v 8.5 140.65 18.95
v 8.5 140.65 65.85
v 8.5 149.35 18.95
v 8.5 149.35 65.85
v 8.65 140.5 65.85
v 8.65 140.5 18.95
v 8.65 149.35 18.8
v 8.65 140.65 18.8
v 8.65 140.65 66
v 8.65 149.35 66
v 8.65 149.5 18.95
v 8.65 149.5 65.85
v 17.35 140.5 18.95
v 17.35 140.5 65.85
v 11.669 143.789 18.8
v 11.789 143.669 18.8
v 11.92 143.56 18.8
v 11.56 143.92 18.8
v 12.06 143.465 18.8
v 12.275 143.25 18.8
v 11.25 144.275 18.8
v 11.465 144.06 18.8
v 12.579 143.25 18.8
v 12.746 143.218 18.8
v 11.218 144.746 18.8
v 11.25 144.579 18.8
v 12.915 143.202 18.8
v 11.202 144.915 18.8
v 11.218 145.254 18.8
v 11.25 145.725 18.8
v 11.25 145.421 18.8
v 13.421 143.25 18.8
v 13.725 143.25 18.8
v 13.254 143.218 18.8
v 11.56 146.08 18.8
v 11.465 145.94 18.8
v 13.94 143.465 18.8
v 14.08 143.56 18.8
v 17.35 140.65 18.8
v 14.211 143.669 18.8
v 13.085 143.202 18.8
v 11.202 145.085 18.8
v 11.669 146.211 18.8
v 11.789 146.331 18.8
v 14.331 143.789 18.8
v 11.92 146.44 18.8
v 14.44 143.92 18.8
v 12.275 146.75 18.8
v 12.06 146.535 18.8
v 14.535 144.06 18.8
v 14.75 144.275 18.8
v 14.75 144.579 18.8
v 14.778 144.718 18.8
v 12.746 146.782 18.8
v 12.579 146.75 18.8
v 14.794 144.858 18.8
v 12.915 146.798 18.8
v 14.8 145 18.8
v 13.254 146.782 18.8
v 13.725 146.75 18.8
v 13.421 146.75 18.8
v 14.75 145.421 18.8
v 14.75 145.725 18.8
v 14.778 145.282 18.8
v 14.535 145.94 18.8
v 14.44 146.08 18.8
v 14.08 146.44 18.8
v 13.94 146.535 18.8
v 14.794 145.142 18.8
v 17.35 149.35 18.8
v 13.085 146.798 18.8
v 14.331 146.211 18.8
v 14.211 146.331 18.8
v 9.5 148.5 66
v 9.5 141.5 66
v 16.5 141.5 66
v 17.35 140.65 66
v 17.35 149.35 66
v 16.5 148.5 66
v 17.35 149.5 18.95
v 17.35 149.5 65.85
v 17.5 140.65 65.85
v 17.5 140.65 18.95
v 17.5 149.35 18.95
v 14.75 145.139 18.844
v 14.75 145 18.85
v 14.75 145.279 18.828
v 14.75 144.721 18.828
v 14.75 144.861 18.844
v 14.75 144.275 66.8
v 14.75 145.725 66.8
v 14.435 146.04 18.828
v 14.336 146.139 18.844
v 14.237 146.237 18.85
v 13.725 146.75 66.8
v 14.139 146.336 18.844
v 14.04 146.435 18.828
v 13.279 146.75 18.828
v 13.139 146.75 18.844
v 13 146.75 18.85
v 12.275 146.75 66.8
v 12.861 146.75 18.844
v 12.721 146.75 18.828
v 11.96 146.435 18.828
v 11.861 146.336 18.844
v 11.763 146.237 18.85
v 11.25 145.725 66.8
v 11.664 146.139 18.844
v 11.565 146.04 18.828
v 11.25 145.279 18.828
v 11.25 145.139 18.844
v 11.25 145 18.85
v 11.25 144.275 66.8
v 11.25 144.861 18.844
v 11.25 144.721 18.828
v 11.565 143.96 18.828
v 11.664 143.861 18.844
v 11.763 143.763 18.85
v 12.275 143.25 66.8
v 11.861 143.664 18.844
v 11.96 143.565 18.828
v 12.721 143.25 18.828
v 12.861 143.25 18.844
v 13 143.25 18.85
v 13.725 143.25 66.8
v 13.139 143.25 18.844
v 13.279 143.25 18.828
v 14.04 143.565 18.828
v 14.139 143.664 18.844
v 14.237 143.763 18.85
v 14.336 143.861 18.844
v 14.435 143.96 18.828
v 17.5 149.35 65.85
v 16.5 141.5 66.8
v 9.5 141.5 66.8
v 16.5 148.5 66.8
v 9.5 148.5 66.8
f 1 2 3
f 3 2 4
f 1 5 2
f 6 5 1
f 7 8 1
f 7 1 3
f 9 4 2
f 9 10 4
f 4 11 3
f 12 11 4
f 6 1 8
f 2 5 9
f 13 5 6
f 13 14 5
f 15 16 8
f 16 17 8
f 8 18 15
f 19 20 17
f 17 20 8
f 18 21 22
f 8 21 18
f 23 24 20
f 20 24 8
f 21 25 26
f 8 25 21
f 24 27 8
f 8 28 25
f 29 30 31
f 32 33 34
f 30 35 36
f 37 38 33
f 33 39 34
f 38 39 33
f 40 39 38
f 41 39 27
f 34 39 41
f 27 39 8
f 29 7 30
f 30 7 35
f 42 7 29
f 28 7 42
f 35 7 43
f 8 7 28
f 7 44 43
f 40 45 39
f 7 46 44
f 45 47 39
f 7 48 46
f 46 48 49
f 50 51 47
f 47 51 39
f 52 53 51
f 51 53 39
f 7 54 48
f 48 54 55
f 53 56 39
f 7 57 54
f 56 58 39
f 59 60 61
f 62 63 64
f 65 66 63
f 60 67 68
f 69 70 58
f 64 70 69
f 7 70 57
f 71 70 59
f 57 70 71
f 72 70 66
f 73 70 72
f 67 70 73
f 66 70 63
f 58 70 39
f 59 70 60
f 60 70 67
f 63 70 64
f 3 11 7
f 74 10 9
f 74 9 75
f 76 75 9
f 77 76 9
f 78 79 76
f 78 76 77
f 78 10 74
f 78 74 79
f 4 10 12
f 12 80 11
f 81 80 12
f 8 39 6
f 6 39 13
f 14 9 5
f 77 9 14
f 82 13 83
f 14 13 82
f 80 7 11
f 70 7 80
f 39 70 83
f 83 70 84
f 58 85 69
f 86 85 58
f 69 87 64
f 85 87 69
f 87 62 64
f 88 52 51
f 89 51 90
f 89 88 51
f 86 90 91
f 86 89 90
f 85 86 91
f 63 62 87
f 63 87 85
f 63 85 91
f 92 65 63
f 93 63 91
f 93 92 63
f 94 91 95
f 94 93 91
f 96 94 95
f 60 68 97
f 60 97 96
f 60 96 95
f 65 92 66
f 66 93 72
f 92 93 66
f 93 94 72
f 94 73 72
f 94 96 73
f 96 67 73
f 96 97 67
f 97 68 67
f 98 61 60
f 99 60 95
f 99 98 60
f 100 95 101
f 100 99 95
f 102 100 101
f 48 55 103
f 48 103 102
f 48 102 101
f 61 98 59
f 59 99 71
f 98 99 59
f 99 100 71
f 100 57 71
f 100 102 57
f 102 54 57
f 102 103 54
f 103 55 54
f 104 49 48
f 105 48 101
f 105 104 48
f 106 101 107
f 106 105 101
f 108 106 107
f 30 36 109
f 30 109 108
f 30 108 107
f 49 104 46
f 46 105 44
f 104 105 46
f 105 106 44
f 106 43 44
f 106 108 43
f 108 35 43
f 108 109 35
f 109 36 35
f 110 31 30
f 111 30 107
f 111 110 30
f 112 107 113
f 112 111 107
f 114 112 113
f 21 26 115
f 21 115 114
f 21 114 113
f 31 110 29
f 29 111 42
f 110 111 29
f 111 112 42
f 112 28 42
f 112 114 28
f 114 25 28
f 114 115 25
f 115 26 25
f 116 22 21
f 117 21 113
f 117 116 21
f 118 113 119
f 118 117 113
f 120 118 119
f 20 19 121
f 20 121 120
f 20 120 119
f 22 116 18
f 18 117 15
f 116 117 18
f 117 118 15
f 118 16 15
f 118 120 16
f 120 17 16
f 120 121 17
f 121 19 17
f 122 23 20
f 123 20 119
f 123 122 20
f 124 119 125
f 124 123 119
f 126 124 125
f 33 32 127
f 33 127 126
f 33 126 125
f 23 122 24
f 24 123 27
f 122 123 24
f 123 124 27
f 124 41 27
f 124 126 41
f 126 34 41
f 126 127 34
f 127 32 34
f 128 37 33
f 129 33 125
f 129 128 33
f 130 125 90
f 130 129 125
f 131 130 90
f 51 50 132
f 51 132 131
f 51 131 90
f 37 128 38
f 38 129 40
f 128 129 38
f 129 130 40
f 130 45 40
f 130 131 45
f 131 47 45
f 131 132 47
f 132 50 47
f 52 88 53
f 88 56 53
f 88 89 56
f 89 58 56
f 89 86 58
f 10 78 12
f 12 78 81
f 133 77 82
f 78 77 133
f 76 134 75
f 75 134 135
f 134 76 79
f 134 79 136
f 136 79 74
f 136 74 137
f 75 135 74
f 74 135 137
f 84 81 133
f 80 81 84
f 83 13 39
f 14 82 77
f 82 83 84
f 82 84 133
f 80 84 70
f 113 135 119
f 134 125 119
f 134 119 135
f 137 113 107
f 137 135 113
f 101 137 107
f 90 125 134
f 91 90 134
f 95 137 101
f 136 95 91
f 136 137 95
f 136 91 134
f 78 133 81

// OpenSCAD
// Generated by the canonical parent Python sources and validated exchange pipeline.
polyhedron(points=[[8.5, 140.64999389648438, 18.950000762939453], [8.5, 140.64999389648438, 65.8499984741211], [8.5, 149.35000610351562, 18.950000762939453], [8.5, 149.35000610351562, 65.8499984741211], [8.649999618530273, 140.5, 65.8499984741211], [8.649999618530273, 140.5, 18.950000762939453], [8.649999618530273, 149.35000610351562, 18.799999237060547], [8.649999618530273, 140.64999389648438, 18.799999237060547], [8.649999618530273, 140.64999389648438, 66.0], [8.649999618530273, 149.35000610351562, 66.0], [8.649999618530273, 149.5, 18.950000762939453], [8.649999618530273, 149.5, 65.8499984741211], [17.350000381469727, 140.5, 18.950000762939453], [17.350000381469727, 140.5, 65.8499984741211], [11.668511390686035, 143.7887420654297, 18.799999237060547], [11.788745880126953, 143.66851806640625, 18.799999237060547], [11.91978931427002, 143.56016540527344, 18.799999237060547], [11.560157775878906, 143.91978454589844, 18.799999237060547], [12.06047248840332, 143.46466064453125, 18.799999237060547], [12.275126457214355, 143.25, 18.799999237060547], [11.25, 144.27513122558594, 18.799999237060547], [11.464653968811035, 144.0604705810547, 18.799999237060547], [12.578692436218262, 143.25, 18.799999237060547], [12.745701789855957, 143.21804809570312, 18.799999237060547], [11.218053817749023, 144.74569702148438, 18.799999237060547], [11.25, 144.5786895751953, 18.799999237060547], [12.9149808883667, 143.20201110839844, 18.799999237060547], [11.202009201049805, 144.91497802734375, 18.799999237060547], [11.218053817749023, 145.25430297851562, 18.799999237060547], [11.25, 145.72486877441406, 18.799999237060547], [11.25, 145.4213104248047, 18.799999237060547], [13.421307563781738, 143.25, 18.799999237060547], [13.724873542785645, 143.25, 18.799999237060547], [13.254298210144043, 143.21804809570312, 18.799999237060547], [11.560157775878906, 146.08021545410156, 18.799999237060547], [11.464653968811035, 145.9395294189453, 18.799999237060547], [13.93952751159668, 143.46466064453125, 18.799999237060547], [14.08021068572998, 143.56016540527344, 18.799999237060547], [17.350000381469727, 140.64999389648438, 18.799999237060547], [14.211254119873047, 143.66851806640625, 18.799999237060547], [13.0850191116333, 143.20201110839844, 18.799999237060547], [11.202009201049805, 145.08502197265625, 18.799999237060547], [11.668511390686035, 146.2112579345703, 18.799999237060547], [11.788745880126953, 146.33148193359375, 18.799999237060547], [14.331488609313965, 143.7887420654297, 18.799999237060547], [11.91978931427002, 146.43983459472656, 18.799999237060547], [14.439842224121094, 143.91978454589844, 18.799999237060547], [12.275126457214355, 146.75, 18.799999237060547], [12.06047248840332, 146.53533935546875, 18.799999237060547], [14.535346031188965, 144.0604705810547, 18.799999237060547], [14.75, 144.27513122558594, 18.799999237060547], [14.75, 144.5786895751953, 18.799999237060547], [14.77772045135498, 144.71766662597656, 18.799999237060547], [12.745701789855957, 146.78195190429688, 18.799999237060547], [12.578692436218262, 146.75, 18.799999237060547], [14.794421195983887, 144.8583984375, 18.799999237060547], [12.9149808883667, 146.79798889160156, 18.799999237060547], [14.800000190734863, 145.0, 18.799999237060547], [13.254298210144043, 146.78195190429688, 18.799999237060547], [13.724873542785645, 146.75, 18.799999237060547], [13.421307563781738, 146.75, 18.799999237060547], [14.75, 145.4213104248047, 18.799999237060547], [14.75, 145.72486877441406, 18.799999237060547], [14.77772045135498, 145.28233337402344, 18.799999237060547], [14.535346031188965, 145.9395294189453, 18.799999237060547], [14.439842224121094, 146.08021545410156, 18.799999237060547], [14.08021068572998, 146.43983459472656, 18.799999237060547], [13.93952751159668, 146.53533935546875, 18.799999237060547], [14.794421195983887, 145.1416015625, 18.799999237060547], [17.350000381469727, 149.35000610351562, 18.799999237060547], [13.0850191116333, 146.79798889160156, 18.799999237060547], [14.331488609313965, 146.2112579345703, 18.799999237060547], [14.211254119873047, 146.33148193359375, 18.799999237060547], [9.5, 148.5, 66.0], [9.5, 141.5, 66.0], [16.5, 141.5, 66.0], [17.350000381469727, 140.64999389648438, 66.0], [17.350000381469727, 149.35000610351562, 66.0], [16.5, 148.5, 66.0], [17.350000381469727, 149.5, 18.950000762939453], [17.350000381469727, 149.5, 65.8499984741211], [17.5, 140.64999389648438, 65.8499984741211], [17.5, 140.64999389648438, 18.950000762939453], [17.5, 149.35000610351562, 18.950000762939453], [14.75, 145.13926696777344, 18.844467163085938], [14.75, 145.0, 18.850000381469727], [14.75, 145.27940368652344, 18.827836990356445], [14.75, 144.72059631347656, 18.827836990356445], [14.75, 144.86073303222656, 18.844467163085938], [14.75, 144.27513122558594, 66.80000305175781], [14.75, 145.72486877441406, 66.80000305175781], [14.435002326965332, 146.0398712158203, 18.827836990356445], [14.335908889770508, 146.1389617919922, 18.844467163085938], [14.237436294555664, 146.23744201660156, 18.850000381469727], [13.724873542785645, 146.75, 66.80000305175781], [14.138964653015137, 146.33590698242188, 18.844467163085938], [14.039871215820312, 146.43499755859375, 18.827836990356445], [13.279400825500488, 146.75, 18.827836990356445], [13.139260292053223, 146.75, 18.844467163085938], [13.0, 146.75, 18.850000381469727], [12.275126457214355, 146.75, 66.80000305175781], [12.860739707946777, 146.75, 18.844467163085938], [12.720599174499512, 146.75, 18.827836990356445], [11.960128784179688, 146.43499755859375, 18.827836990356445], [11.861035346984863, 146.33590698242188, 18.844467163085938], [11.762563705444336, 146.23744201660156, 18.850000381469727], [11.25, 145.72486877441406, 66.80000305175781], [11.664091110229492, 146.1389617919922, 18.844467163085938], [11.564996719360352, 146.0398712158203, 18.827836990356445], [11.25, 145.27940368652344, 18.827836990356445], [11.25, 145.13926696777344, 18.844467163085938], [11.25, 145.0, 18.850000381469727], [11.25, 144.27513122558594, 66.80000305175781], [11.25, 144.86073303222656, 18.844467163085938], [11.25, 144.72059631347656, 18.827836990356445], [11.564996719360352, 143.9601287841797, 18.827836990356445], [11.664091110229492, 143.8610382080078, 18.844467163085938], [11.76256275177002, 143.76255798339844, 18.850000381469727], [12.275126457214355, 143.25, 66.80000305175781], [11.861034393310547, 143.66409301757812, 18.844467163085938], [11.960128784179688, 143.56500244140625, 18.827836990356445], [12.720599174499512, 143.25, 18.827836990356445], [12.860739707946777, 143.25, 18.844467163085938], [13.0, 143.25, 18.850000381469727], [13.724873542785645, 143.25, 66.80000305175781], [13.139260292053223, 143.25, 18.844467163085938], [13.279400825500488, 143.25, 18.827836990356445], [14.039871215820312, 143.56500244140625, 18.827836990356445], [14.138965606689453, 143.66409301757812, 18.844467163085938], [14.23743724822998, 143.76255798339844, 18.850000381469727], [14.335908889770508, 143.8610382080078, 18.844467163085938], [14.435003280639648, 143.9601287841797, 18.827836990356445], [17.5, 149.35000610351562, 65.8499984741211], [16.5, 141.5, 66.80000305175781], [9.5, 141.5, 66.80000305175781], [16.5, 148.5, 66.80000305175781], [9.5, 148.5, 66.80000305175781]],faces=[[2, 1, 0], [3, 1, 2], [1, 4, 0], [0, 4, 5], [0, 7, 6], [2, 0, 6], [1, 3, 8], [3, 9, 8], [2, 10, 3], [3, 10, 11], [7, 0, 5], [8, 4, 1], [5, 4, 12], [4, 13, 12], [7, 15, 14], [7, 16, 15], [14, 17, 7], [16, 19, 18], [7, 19, 16], [21, 20, 17], [17, 20, 7], [19, 23, 22], [7, 23, 19], [25, 24, 20], [20, 24, 7], [7, 26, 23], [24, 27, 7], [30, 29, 28], [33, 32, 31], [35, 34, 29], [32, 37, 36], [33, 38, 32], [32, 38, 37], [37, 38, 39], [26, 38, 40], [40, 38, 33], [7, 38, 26], [29, 6, 28], [34, 6, 29], [28, 6, 41], [41, 6, 27], [42, 6, 34], [27, 6, 7], [42, 43, 6], [38, 44, 39], [43, 45, 6], [38, 46, 44], [45, 47, 6], [48, 47, 45], [46, 50, 49], [38, 50, 46], [50, 52, 51], [38, 52, 50], [47, 53, 6], [54, 53, 47], [38, 55, 52], [53, 56, 6], [38, 57, 55], [60, 59, 58], [63, 62, 61], [62, 65, 64], [67, 66, 59], [57, 69, 68], [68, 69, 63], [56, 69, 6], [58, 69, 70], [70, 69, 56], [65, 69, 71], [71, 69, 72], [72, 69, 66], [62, 69, 65], [38, 69, 57], [59, 69, 58], [66, 69, 59], [63, 69, 62], [6, 10, 2], [8, 9, 73], [74, 8, 73], [8, 74, 75], [8, 75, 76], [75, 78, 77], [76, 75, 77], [73, 9, 77], [78, 73, 77], [11, 9, 3], [10, 79, 11], [11, 79, 80], [5, 38, 7], [12, 38, 5], [4, 8, 13], [13, 8, 76], [82, 12, 81], [81, 12, 13], [10, 6, 79], [79, 6, 69], [82, 69, 38], [83, 69, 82], [68, 84, 57], [57, 84, 85], [63, 86, 68], [68, 86, 84], [63, 61, 86], [50, 51, 87], [89, 50, 88], [50, 87, 88], [90, 89, 85], [89, 88, 85], [90, 85, 84], [86, 61, 62], [84, 86, 62], [90, 84, 62], [62, 64, 91], [90, 62, 92], [62, 91, 92], [94, 90, 93], [90, 92, 93], [94, 93, 95], [96, 67, 59], [95, 96, 59], [94, 95, 59], [65, 91, 64], [71, 92, 65], [65, 92, 91], [71, 93, 92], [71, 72, 93], [72, 95, 93], [72, 66, 95], [66, 96, 95], [66, 67, 96], [59, 60, 97], [94, 59, 98], [59, 97, 98], [100, 94, 99], [94, 98, 99], [100, 99, 101], [102, 54, 47], [101, 102, 47], [100, 101, 47], [58, 97, 60], [70, 98, 58], [58, 98, 97], [70, 99, 98], [70, 56, 99], [56, 101, 99], [56, 53, 101], [53, 102, 101], [53, 54, 102], [47, 48, 103], [100, 47, 104], [47, 103, 104], [106, 100, 105], [100, 104, 105], [106, 105, 107], [108, 35, 29], [107, 108, 29], [106, 107, 29], [45, 103, 48], [43, 104, 45], [45, 104, 103], [43, 105, 104], [43, 42, 105], [42, 107, 105], [42, 34, 107], [34, 108, 107], [34, 35, 108], [29, 30, 109], [106, 29, 110], [29, 109, 110], [112, 106, 111], [106, 110, 111], [112, 111, 113], [114, 25, 20], [113, 114, 20], [112, 113, 20], [28, 109, 30], [41, 110, 28], [28, 110, 109], [41, 111, 110], [41, 27, 111], [27, 113, 111], [27, 24, 113], [24, 114, 113], [24, 25, 114], [20, 21, 115], [112, 20, 116], [20, 115, 116], [118, 112, 117], [112, 116, 117], [118, 117, 119], [120, 18, 19], [119, 120, 19], [118, 119, 19], [17, 115, 21], [14, 116, 17], [17, 116, 115], [14, 117, 116], [14, 15, 117], [15, 119, 117], [15, 16, 119], [16, 120, 119], [16, 18, 120], [19, 22, 121], [118, 19, 122], [19, 121, 122], [124, 118, 123], [118, 122, 123], [124, 123, 125], [126, 31, 32], [125, 126, 32], [124, 125, 32], [23, 121, 22], [26, 122, 23], [23, 122, 121], [26, 123, 122], [26, 40, 123], [40, 125, 123], [40, 33, 125], [33, 126, 125], [33, 31, 126], [32, 36, 127], [124, 32, 128], [32, 127, 128], [89, 124, 129], [124, 128, 129], [89, 129, 130], [131, 49, 50], [130, 131, 50], [89, 130, 50], [37, 127, 36], [39, 128, 37], [37, 128, 127], [39, 129, 128], [39, 44, 129], [44, 130, 129], [44, 46, 130], [46, 131, 130], [46, 49, 131], [52, 87, 51], [52, 55, 87], [55, 88, 87], [55, 57, 88], [57, 85, 88], [11, 77, 9], [80, 77, 11], [81, 76, 132], [132, 76, 77], [74, 133, 75], [134, 133, 74], [78, 75, 133], [135, 78, 133], [73, 78, 135], [136, 73, 135], [73, 134, 74], [136, 134, 73], [132, 80, 83], [83, 80, 79], [38, 12, 82], [76, 81, 13], [83, 82, 81], [132, 83, 81], [69, 83, 79], [118, 134, 112], [118, 124, 133], [134, 118, 133], [106, 112, 136], [112, 134, 136], [106, 136, 100], [133, 124, 89], [133, 89, 90], [100, 136, 94], [90, 94, 135], [94, 136, 135], [133, 90, 135], [80, 132, 77]],convexity=10);
